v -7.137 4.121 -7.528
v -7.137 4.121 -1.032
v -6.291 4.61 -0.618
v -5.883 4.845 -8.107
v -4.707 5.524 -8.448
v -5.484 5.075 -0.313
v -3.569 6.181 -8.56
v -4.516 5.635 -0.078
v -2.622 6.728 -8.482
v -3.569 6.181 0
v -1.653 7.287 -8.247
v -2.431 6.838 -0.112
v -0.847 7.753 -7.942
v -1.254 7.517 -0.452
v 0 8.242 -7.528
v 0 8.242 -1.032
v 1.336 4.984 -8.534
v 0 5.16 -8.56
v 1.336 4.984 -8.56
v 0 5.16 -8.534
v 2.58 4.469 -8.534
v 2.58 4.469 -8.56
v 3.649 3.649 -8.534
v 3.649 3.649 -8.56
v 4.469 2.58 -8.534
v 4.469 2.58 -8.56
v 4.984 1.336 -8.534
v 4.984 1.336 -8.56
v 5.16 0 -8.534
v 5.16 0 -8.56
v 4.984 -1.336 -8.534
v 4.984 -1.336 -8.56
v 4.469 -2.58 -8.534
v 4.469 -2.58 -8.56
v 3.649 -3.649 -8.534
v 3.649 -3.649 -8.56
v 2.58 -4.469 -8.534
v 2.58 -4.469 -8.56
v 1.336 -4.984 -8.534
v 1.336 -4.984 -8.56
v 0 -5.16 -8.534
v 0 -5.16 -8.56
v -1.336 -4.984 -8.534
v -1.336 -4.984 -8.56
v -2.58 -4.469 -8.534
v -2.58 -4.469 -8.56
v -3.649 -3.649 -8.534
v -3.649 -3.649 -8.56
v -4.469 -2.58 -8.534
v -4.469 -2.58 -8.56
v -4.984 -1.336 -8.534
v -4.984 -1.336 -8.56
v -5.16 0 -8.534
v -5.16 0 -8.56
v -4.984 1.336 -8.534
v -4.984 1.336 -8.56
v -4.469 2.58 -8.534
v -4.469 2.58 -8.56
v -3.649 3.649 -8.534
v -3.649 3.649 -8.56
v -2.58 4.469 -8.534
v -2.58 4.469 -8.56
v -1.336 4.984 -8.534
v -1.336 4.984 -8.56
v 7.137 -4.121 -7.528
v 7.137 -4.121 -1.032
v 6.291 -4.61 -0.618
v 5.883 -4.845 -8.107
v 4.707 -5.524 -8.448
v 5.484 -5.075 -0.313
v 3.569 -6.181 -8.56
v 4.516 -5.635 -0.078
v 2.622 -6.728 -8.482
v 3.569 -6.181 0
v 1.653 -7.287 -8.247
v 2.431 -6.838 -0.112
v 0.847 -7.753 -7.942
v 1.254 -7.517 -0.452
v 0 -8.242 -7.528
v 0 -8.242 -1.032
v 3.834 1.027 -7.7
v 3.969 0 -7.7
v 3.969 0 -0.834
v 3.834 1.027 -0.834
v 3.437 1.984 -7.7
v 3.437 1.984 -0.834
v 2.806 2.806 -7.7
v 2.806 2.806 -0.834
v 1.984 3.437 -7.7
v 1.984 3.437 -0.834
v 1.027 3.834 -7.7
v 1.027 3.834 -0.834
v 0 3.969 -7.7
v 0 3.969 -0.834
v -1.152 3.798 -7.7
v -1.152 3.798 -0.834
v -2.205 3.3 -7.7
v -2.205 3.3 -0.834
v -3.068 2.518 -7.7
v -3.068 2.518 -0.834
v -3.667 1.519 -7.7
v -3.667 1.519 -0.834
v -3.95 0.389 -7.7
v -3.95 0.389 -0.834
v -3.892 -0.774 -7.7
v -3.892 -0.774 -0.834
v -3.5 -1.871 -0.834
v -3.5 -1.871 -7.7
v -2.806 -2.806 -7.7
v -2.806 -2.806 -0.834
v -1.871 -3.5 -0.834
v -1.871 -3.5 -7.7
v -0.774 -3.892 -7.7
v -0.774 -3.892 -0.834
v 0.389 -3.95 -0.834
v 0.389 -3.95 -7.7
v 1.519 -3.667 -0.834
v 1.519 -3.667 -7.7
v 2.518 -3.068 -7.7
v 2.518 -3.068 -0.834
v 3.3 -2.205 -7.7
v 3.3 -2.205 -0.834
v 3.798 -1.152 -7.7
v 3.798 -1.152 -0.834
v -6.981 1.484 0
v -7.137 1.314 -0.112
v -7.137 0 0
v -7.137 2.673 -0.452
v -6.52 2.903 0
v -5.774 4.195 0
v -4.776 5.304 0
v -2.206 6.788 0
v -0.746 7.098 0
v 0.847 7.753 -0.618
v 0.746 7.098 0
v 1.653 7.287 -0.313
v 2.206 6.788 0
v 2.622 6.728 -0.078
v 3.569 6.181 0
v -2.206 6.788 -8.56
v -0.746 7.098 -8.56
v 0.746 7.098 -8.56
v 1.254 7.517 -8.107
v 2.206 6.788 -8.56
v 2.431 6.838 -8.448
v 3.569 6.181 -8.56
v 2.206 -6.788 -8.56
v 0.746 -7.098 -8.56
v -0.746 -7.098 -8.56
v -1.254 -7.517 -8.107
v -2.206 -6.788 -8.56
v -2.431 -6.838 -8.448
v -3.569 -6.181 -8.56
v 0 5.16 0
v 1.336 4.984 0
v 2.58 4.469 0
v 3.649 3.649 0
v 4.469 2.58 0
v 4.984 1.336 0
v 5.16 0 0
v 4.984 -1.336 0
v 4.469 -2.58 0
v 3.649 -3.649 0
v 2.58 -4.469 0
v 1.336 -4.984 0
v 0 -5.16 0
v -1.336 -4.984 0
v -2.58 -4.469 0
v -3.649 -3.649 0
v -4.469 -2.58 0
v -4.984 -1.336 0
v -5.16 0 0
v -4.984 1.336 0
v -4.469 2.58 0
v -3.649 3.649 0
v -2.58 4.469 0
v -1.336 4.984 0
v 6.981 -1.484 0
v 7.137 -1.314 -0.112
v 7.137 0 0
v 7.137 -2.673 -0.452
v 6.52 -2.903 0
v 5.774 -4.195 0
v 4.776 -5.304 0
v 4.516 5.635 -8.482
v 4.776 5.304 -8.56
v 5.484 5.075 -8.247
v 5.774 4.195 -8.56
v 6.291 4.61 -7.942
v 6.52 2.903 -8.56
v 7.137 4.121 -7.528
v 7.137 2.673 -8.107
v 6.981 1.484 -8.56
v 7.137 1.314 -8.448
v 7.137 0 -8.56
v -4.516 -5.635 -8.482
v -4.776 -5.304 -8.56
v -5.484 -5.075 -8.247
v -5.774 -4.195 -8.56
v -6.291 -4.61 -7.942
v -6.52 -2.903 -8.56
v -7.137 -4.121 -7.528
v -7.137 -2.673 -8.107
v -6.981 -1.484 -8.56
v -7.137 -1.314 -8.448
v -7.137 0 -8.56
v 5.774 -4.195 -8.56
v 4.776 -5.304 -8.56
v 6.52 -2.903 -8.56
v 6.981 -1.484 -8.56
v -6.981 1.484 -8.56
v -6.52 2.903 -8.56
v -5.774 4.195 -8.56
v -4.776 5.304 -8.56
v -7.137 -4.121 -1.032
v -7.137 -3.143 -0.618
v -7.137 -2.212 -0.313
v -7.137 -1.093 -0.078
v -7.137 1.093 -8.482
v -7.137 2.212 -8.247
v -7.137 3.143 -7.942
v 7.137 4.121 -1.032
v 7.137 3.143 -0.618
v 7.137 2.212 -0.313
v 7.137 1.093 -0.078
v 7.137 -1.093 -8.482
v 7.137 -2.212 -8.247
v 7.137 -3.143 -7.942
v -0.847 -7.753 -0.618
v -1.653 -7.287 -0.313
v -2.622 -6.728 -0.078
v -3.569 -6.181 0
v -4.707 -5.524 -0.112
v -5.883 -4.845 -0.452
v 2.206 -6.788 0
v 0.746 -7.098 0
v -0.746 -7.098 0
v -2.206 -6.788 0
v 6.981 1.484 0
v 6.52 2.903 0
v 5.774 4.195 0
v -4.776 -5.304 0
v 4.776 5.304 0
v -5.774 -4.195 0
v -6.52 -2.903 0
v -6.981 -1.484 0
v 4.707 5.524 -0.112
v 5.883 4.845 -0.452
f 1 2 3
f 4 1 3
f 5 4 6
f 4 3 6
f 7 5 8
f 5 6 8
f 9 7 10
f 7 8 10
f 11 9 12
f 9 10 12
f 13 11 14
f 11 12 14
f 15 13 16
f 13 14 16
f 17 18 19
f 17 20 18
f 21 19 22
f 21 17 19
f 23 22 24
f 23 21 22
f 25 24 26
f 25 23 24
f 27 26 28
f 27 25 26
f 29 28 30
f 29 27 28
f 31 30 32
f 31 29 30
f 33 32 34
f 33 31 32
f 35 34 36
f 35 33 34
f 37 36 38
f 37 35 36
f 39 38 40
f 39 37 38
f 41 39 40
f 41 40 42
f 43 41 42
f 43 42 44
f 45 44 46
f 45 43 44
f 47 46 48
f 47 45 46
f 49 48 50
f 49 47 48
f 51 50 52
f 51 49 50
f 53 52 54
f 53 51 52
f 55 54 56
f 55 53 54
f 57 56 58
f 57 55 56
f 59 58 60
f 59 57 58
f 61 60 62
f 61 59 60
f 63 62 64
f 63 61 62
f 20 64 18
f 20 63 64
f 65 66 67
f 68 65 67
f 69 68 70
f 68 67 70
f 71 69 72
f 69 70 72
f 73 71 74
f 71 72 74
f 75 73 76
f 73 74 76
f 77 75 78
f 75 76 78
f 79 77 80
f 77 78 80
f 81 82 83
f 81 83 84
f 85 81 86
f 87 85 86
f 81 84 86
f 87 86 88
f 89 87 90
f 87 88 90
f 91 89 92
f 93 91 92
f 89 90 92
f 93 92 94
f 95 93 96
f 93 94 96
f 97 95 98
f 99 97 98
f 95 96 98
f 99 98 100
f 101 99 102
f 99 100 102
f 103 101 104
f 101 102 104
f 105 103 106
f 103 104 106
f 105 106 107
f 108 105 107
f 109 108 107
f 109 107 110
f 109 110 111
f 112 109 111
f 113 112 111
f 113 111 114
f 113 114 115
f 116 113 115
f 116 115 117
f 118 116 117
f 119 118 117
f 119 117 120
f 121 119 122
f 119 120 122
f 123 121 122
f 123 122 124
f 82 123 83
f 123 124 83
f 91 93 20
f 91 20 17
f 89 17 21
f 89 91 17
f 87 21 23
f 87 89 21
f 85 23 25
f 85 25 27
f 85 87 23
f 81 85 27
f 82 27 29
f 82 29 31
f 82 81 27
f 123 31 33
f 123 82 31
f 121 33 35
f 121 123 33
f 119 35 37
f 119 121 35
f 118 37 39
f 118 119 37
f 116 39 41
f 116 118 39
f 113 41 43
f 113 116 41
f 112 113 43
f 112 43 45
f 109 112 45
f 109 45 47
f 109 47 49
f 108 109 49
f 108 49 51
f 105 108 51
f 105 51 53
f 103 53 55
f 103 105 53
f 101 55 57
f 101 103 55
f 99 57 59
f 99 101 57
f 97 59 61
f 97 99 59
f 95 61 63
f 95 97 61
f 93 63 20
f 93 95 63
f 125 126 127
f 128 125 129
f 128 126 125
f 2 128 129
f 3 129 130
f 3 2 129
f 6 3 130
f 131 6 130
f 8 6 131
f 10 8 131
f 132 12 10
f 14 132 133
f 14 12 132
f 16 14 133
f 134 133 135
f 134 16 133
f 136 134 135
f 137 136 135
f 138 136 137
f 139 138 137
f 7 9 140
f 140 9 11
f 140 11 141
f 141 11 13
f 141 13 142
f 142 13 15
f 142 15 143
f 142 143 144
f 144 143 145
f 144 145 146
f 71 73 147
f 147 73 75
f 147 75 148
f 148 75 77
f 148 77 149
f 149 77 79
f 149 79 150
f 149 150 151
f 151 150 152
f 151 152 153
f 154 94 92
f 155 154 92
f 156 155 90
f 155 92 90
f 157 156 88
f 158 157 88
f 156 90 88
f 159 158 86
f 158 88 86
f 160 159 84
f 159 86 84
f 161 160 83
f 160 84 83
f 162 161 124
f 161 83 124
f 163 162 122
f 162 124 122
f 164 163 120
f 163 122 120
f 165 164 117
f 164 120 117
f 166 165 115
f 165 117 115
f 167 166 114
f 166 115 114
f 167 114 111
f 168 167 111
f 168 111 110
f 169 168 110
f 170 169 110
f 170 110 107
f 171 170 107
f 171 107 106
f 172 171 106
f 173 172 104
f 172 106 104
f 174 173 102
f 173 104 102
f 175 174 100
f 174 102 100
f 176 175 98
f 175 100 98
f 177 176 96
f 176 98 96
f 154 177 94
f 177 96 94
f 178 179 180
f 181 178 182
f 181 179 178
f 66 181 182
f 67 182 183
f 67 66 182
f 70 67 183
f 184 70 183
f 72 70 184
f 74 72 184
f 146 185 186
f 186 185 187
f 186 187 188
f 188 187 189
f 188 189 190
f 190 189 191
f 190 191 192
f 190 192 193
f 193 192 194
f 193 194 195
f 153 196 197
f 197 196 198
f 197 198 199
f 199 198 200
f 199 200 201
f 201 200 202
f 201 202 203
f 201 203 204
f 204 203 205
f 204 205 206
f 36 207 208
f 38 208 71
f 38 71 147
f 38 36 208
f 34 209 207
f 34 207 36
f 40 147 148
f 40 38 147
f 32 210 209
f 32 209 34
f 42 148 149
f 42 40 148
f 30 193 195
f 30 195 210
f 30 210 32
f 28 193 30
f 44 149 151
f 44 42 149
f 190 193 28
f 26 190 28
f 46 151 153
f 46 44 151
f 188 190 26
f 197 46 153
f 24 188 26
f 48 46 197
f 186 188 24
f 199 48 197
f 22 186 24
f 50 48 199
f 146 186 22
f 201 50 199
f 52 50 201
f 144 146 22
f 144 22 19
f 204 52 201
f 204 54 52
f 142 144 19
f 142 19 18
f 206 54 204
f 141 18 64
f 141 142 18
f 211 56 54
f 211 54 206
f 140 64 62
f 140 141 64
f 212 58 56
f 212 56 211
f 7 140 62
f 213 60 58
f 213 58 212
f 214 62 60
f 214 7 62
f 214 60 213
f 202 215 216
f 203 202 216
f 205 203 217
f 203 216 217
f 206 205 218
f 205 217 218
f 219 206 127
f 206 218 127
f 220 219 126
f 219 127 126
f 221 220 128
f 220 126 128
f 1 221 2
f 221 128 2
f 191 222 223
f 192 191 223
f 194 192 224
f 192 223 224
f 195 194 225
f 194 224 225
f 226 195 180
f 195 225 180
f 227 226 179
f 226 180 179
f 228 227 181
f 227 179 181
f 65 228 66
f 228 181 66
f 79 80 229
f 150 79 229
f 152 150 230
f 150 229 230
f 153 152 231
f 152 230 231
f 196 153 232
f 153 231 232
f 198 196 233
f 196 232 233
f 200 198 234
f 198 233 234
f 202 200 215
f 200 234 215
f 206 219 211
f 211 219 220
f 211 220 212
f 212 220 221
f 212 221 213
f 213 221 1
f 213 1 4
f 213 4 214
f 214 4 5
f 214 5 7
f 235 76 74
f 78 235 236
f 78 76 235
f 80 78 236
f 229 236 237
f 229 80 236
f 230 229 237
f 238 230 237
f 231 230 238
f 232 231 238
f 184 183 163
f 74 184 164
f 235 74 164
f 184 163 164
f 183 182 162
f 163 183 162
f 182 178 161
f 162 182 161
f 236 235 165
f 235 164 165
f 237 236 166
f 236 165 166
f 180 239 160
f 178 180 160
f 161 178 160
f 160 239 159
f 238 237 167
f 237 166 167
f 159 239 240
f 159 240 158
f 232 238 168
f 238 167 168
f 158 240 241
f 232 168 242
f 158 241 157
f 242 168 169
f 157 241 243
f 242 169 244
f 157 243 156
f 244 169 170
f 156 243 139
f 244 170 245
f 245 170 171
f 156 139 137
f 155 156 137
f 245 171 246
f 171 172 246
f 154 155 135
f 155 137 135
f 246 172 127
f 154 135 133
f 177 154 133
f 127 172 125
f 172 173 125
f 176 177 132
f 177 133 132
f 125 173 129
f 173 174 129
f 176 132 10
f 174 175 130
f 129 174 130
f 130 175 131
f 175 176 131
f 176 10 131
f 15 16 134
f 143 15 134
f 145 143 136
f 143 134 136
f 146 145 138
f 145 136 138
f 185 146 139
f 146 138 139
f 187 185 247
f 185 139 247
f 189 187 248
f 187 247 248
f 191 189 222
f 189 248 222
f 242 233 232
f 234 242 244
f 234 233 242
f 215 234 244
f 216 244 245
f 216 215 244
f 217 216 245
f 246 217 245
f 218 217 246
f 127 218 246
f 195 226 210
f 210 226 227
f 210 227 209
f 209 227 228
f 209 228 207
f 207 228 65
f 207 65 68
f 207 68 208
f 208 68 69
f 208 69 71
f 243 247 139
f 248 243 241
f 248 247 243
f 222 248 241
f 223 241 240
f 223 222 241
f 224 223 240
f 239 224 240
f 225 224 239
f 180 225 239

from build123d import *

# Parameters (mm, degrees)
BASENUTSKE_R  = 3.96875
BASENUT_DEPTH = 8.5598


with BuildPart() as part:
    # BaseNutSke → BaseNut (new body)
    with BuildSketch(Plane.XY):
        Polygon((7.1374, 4.120779811), (7.1374, -4.120779811), (0, -8.241559623), (-7.1374, -4.120779811), (-7.1374, 4.120779811), (0, 8.241559623), align=None)
        Circle(BASENUTSKE_R, mode=Mode.SUBTRACT)
    extrude(amount=-BASENUT_DEPTH)

    # Sketch3 → Double-Chamfer (revolve, cut)
    with BuildSketch(Plane(origin=(0, 0, 0), x_dir=(0, 0, -1), z_dir=(1, 0, 0))):
        Polygon((8.5598, 7.1374), (7.527798, 8.241559623), (7.527798, 20.941559623), (21.2598, 20.941559623), (21.2598, 7.1374), align=None)
        Polygon((1.032002, 20.941559623), (-12.7, 20.941559623), (-12.7, 7.1374), (0, 7.1374), (1.032002, 8.241559623), align=None)
    revolve(axis=Axis((0, 0, 0), (0, 0, -1)), mode=Mode.SUBTRACT)

    # Sketch5 → EndChamfer (revolve, cut)
    with BuildSketch(Plane(origin=(0, 0, 0), x_dir=(0, 0, -1), z_dir=(1, 0, 0))):
        Polygon((8.5344, 5.16001), (7.616857845, 3.849624), (8.5852, 3.849624), (8.5852, 5.16001), align=None)
        Polygon((-0.0508, 5.16001), (0, 5.16001), (0.917542155, 3.849624), (-0.0508, 3.849624), align=None)
    revolve(axis=Axis((0, 0, -25.037505729), (0, 0, -1)), mode=Mode.SUBTRACT)


solid = part.part
